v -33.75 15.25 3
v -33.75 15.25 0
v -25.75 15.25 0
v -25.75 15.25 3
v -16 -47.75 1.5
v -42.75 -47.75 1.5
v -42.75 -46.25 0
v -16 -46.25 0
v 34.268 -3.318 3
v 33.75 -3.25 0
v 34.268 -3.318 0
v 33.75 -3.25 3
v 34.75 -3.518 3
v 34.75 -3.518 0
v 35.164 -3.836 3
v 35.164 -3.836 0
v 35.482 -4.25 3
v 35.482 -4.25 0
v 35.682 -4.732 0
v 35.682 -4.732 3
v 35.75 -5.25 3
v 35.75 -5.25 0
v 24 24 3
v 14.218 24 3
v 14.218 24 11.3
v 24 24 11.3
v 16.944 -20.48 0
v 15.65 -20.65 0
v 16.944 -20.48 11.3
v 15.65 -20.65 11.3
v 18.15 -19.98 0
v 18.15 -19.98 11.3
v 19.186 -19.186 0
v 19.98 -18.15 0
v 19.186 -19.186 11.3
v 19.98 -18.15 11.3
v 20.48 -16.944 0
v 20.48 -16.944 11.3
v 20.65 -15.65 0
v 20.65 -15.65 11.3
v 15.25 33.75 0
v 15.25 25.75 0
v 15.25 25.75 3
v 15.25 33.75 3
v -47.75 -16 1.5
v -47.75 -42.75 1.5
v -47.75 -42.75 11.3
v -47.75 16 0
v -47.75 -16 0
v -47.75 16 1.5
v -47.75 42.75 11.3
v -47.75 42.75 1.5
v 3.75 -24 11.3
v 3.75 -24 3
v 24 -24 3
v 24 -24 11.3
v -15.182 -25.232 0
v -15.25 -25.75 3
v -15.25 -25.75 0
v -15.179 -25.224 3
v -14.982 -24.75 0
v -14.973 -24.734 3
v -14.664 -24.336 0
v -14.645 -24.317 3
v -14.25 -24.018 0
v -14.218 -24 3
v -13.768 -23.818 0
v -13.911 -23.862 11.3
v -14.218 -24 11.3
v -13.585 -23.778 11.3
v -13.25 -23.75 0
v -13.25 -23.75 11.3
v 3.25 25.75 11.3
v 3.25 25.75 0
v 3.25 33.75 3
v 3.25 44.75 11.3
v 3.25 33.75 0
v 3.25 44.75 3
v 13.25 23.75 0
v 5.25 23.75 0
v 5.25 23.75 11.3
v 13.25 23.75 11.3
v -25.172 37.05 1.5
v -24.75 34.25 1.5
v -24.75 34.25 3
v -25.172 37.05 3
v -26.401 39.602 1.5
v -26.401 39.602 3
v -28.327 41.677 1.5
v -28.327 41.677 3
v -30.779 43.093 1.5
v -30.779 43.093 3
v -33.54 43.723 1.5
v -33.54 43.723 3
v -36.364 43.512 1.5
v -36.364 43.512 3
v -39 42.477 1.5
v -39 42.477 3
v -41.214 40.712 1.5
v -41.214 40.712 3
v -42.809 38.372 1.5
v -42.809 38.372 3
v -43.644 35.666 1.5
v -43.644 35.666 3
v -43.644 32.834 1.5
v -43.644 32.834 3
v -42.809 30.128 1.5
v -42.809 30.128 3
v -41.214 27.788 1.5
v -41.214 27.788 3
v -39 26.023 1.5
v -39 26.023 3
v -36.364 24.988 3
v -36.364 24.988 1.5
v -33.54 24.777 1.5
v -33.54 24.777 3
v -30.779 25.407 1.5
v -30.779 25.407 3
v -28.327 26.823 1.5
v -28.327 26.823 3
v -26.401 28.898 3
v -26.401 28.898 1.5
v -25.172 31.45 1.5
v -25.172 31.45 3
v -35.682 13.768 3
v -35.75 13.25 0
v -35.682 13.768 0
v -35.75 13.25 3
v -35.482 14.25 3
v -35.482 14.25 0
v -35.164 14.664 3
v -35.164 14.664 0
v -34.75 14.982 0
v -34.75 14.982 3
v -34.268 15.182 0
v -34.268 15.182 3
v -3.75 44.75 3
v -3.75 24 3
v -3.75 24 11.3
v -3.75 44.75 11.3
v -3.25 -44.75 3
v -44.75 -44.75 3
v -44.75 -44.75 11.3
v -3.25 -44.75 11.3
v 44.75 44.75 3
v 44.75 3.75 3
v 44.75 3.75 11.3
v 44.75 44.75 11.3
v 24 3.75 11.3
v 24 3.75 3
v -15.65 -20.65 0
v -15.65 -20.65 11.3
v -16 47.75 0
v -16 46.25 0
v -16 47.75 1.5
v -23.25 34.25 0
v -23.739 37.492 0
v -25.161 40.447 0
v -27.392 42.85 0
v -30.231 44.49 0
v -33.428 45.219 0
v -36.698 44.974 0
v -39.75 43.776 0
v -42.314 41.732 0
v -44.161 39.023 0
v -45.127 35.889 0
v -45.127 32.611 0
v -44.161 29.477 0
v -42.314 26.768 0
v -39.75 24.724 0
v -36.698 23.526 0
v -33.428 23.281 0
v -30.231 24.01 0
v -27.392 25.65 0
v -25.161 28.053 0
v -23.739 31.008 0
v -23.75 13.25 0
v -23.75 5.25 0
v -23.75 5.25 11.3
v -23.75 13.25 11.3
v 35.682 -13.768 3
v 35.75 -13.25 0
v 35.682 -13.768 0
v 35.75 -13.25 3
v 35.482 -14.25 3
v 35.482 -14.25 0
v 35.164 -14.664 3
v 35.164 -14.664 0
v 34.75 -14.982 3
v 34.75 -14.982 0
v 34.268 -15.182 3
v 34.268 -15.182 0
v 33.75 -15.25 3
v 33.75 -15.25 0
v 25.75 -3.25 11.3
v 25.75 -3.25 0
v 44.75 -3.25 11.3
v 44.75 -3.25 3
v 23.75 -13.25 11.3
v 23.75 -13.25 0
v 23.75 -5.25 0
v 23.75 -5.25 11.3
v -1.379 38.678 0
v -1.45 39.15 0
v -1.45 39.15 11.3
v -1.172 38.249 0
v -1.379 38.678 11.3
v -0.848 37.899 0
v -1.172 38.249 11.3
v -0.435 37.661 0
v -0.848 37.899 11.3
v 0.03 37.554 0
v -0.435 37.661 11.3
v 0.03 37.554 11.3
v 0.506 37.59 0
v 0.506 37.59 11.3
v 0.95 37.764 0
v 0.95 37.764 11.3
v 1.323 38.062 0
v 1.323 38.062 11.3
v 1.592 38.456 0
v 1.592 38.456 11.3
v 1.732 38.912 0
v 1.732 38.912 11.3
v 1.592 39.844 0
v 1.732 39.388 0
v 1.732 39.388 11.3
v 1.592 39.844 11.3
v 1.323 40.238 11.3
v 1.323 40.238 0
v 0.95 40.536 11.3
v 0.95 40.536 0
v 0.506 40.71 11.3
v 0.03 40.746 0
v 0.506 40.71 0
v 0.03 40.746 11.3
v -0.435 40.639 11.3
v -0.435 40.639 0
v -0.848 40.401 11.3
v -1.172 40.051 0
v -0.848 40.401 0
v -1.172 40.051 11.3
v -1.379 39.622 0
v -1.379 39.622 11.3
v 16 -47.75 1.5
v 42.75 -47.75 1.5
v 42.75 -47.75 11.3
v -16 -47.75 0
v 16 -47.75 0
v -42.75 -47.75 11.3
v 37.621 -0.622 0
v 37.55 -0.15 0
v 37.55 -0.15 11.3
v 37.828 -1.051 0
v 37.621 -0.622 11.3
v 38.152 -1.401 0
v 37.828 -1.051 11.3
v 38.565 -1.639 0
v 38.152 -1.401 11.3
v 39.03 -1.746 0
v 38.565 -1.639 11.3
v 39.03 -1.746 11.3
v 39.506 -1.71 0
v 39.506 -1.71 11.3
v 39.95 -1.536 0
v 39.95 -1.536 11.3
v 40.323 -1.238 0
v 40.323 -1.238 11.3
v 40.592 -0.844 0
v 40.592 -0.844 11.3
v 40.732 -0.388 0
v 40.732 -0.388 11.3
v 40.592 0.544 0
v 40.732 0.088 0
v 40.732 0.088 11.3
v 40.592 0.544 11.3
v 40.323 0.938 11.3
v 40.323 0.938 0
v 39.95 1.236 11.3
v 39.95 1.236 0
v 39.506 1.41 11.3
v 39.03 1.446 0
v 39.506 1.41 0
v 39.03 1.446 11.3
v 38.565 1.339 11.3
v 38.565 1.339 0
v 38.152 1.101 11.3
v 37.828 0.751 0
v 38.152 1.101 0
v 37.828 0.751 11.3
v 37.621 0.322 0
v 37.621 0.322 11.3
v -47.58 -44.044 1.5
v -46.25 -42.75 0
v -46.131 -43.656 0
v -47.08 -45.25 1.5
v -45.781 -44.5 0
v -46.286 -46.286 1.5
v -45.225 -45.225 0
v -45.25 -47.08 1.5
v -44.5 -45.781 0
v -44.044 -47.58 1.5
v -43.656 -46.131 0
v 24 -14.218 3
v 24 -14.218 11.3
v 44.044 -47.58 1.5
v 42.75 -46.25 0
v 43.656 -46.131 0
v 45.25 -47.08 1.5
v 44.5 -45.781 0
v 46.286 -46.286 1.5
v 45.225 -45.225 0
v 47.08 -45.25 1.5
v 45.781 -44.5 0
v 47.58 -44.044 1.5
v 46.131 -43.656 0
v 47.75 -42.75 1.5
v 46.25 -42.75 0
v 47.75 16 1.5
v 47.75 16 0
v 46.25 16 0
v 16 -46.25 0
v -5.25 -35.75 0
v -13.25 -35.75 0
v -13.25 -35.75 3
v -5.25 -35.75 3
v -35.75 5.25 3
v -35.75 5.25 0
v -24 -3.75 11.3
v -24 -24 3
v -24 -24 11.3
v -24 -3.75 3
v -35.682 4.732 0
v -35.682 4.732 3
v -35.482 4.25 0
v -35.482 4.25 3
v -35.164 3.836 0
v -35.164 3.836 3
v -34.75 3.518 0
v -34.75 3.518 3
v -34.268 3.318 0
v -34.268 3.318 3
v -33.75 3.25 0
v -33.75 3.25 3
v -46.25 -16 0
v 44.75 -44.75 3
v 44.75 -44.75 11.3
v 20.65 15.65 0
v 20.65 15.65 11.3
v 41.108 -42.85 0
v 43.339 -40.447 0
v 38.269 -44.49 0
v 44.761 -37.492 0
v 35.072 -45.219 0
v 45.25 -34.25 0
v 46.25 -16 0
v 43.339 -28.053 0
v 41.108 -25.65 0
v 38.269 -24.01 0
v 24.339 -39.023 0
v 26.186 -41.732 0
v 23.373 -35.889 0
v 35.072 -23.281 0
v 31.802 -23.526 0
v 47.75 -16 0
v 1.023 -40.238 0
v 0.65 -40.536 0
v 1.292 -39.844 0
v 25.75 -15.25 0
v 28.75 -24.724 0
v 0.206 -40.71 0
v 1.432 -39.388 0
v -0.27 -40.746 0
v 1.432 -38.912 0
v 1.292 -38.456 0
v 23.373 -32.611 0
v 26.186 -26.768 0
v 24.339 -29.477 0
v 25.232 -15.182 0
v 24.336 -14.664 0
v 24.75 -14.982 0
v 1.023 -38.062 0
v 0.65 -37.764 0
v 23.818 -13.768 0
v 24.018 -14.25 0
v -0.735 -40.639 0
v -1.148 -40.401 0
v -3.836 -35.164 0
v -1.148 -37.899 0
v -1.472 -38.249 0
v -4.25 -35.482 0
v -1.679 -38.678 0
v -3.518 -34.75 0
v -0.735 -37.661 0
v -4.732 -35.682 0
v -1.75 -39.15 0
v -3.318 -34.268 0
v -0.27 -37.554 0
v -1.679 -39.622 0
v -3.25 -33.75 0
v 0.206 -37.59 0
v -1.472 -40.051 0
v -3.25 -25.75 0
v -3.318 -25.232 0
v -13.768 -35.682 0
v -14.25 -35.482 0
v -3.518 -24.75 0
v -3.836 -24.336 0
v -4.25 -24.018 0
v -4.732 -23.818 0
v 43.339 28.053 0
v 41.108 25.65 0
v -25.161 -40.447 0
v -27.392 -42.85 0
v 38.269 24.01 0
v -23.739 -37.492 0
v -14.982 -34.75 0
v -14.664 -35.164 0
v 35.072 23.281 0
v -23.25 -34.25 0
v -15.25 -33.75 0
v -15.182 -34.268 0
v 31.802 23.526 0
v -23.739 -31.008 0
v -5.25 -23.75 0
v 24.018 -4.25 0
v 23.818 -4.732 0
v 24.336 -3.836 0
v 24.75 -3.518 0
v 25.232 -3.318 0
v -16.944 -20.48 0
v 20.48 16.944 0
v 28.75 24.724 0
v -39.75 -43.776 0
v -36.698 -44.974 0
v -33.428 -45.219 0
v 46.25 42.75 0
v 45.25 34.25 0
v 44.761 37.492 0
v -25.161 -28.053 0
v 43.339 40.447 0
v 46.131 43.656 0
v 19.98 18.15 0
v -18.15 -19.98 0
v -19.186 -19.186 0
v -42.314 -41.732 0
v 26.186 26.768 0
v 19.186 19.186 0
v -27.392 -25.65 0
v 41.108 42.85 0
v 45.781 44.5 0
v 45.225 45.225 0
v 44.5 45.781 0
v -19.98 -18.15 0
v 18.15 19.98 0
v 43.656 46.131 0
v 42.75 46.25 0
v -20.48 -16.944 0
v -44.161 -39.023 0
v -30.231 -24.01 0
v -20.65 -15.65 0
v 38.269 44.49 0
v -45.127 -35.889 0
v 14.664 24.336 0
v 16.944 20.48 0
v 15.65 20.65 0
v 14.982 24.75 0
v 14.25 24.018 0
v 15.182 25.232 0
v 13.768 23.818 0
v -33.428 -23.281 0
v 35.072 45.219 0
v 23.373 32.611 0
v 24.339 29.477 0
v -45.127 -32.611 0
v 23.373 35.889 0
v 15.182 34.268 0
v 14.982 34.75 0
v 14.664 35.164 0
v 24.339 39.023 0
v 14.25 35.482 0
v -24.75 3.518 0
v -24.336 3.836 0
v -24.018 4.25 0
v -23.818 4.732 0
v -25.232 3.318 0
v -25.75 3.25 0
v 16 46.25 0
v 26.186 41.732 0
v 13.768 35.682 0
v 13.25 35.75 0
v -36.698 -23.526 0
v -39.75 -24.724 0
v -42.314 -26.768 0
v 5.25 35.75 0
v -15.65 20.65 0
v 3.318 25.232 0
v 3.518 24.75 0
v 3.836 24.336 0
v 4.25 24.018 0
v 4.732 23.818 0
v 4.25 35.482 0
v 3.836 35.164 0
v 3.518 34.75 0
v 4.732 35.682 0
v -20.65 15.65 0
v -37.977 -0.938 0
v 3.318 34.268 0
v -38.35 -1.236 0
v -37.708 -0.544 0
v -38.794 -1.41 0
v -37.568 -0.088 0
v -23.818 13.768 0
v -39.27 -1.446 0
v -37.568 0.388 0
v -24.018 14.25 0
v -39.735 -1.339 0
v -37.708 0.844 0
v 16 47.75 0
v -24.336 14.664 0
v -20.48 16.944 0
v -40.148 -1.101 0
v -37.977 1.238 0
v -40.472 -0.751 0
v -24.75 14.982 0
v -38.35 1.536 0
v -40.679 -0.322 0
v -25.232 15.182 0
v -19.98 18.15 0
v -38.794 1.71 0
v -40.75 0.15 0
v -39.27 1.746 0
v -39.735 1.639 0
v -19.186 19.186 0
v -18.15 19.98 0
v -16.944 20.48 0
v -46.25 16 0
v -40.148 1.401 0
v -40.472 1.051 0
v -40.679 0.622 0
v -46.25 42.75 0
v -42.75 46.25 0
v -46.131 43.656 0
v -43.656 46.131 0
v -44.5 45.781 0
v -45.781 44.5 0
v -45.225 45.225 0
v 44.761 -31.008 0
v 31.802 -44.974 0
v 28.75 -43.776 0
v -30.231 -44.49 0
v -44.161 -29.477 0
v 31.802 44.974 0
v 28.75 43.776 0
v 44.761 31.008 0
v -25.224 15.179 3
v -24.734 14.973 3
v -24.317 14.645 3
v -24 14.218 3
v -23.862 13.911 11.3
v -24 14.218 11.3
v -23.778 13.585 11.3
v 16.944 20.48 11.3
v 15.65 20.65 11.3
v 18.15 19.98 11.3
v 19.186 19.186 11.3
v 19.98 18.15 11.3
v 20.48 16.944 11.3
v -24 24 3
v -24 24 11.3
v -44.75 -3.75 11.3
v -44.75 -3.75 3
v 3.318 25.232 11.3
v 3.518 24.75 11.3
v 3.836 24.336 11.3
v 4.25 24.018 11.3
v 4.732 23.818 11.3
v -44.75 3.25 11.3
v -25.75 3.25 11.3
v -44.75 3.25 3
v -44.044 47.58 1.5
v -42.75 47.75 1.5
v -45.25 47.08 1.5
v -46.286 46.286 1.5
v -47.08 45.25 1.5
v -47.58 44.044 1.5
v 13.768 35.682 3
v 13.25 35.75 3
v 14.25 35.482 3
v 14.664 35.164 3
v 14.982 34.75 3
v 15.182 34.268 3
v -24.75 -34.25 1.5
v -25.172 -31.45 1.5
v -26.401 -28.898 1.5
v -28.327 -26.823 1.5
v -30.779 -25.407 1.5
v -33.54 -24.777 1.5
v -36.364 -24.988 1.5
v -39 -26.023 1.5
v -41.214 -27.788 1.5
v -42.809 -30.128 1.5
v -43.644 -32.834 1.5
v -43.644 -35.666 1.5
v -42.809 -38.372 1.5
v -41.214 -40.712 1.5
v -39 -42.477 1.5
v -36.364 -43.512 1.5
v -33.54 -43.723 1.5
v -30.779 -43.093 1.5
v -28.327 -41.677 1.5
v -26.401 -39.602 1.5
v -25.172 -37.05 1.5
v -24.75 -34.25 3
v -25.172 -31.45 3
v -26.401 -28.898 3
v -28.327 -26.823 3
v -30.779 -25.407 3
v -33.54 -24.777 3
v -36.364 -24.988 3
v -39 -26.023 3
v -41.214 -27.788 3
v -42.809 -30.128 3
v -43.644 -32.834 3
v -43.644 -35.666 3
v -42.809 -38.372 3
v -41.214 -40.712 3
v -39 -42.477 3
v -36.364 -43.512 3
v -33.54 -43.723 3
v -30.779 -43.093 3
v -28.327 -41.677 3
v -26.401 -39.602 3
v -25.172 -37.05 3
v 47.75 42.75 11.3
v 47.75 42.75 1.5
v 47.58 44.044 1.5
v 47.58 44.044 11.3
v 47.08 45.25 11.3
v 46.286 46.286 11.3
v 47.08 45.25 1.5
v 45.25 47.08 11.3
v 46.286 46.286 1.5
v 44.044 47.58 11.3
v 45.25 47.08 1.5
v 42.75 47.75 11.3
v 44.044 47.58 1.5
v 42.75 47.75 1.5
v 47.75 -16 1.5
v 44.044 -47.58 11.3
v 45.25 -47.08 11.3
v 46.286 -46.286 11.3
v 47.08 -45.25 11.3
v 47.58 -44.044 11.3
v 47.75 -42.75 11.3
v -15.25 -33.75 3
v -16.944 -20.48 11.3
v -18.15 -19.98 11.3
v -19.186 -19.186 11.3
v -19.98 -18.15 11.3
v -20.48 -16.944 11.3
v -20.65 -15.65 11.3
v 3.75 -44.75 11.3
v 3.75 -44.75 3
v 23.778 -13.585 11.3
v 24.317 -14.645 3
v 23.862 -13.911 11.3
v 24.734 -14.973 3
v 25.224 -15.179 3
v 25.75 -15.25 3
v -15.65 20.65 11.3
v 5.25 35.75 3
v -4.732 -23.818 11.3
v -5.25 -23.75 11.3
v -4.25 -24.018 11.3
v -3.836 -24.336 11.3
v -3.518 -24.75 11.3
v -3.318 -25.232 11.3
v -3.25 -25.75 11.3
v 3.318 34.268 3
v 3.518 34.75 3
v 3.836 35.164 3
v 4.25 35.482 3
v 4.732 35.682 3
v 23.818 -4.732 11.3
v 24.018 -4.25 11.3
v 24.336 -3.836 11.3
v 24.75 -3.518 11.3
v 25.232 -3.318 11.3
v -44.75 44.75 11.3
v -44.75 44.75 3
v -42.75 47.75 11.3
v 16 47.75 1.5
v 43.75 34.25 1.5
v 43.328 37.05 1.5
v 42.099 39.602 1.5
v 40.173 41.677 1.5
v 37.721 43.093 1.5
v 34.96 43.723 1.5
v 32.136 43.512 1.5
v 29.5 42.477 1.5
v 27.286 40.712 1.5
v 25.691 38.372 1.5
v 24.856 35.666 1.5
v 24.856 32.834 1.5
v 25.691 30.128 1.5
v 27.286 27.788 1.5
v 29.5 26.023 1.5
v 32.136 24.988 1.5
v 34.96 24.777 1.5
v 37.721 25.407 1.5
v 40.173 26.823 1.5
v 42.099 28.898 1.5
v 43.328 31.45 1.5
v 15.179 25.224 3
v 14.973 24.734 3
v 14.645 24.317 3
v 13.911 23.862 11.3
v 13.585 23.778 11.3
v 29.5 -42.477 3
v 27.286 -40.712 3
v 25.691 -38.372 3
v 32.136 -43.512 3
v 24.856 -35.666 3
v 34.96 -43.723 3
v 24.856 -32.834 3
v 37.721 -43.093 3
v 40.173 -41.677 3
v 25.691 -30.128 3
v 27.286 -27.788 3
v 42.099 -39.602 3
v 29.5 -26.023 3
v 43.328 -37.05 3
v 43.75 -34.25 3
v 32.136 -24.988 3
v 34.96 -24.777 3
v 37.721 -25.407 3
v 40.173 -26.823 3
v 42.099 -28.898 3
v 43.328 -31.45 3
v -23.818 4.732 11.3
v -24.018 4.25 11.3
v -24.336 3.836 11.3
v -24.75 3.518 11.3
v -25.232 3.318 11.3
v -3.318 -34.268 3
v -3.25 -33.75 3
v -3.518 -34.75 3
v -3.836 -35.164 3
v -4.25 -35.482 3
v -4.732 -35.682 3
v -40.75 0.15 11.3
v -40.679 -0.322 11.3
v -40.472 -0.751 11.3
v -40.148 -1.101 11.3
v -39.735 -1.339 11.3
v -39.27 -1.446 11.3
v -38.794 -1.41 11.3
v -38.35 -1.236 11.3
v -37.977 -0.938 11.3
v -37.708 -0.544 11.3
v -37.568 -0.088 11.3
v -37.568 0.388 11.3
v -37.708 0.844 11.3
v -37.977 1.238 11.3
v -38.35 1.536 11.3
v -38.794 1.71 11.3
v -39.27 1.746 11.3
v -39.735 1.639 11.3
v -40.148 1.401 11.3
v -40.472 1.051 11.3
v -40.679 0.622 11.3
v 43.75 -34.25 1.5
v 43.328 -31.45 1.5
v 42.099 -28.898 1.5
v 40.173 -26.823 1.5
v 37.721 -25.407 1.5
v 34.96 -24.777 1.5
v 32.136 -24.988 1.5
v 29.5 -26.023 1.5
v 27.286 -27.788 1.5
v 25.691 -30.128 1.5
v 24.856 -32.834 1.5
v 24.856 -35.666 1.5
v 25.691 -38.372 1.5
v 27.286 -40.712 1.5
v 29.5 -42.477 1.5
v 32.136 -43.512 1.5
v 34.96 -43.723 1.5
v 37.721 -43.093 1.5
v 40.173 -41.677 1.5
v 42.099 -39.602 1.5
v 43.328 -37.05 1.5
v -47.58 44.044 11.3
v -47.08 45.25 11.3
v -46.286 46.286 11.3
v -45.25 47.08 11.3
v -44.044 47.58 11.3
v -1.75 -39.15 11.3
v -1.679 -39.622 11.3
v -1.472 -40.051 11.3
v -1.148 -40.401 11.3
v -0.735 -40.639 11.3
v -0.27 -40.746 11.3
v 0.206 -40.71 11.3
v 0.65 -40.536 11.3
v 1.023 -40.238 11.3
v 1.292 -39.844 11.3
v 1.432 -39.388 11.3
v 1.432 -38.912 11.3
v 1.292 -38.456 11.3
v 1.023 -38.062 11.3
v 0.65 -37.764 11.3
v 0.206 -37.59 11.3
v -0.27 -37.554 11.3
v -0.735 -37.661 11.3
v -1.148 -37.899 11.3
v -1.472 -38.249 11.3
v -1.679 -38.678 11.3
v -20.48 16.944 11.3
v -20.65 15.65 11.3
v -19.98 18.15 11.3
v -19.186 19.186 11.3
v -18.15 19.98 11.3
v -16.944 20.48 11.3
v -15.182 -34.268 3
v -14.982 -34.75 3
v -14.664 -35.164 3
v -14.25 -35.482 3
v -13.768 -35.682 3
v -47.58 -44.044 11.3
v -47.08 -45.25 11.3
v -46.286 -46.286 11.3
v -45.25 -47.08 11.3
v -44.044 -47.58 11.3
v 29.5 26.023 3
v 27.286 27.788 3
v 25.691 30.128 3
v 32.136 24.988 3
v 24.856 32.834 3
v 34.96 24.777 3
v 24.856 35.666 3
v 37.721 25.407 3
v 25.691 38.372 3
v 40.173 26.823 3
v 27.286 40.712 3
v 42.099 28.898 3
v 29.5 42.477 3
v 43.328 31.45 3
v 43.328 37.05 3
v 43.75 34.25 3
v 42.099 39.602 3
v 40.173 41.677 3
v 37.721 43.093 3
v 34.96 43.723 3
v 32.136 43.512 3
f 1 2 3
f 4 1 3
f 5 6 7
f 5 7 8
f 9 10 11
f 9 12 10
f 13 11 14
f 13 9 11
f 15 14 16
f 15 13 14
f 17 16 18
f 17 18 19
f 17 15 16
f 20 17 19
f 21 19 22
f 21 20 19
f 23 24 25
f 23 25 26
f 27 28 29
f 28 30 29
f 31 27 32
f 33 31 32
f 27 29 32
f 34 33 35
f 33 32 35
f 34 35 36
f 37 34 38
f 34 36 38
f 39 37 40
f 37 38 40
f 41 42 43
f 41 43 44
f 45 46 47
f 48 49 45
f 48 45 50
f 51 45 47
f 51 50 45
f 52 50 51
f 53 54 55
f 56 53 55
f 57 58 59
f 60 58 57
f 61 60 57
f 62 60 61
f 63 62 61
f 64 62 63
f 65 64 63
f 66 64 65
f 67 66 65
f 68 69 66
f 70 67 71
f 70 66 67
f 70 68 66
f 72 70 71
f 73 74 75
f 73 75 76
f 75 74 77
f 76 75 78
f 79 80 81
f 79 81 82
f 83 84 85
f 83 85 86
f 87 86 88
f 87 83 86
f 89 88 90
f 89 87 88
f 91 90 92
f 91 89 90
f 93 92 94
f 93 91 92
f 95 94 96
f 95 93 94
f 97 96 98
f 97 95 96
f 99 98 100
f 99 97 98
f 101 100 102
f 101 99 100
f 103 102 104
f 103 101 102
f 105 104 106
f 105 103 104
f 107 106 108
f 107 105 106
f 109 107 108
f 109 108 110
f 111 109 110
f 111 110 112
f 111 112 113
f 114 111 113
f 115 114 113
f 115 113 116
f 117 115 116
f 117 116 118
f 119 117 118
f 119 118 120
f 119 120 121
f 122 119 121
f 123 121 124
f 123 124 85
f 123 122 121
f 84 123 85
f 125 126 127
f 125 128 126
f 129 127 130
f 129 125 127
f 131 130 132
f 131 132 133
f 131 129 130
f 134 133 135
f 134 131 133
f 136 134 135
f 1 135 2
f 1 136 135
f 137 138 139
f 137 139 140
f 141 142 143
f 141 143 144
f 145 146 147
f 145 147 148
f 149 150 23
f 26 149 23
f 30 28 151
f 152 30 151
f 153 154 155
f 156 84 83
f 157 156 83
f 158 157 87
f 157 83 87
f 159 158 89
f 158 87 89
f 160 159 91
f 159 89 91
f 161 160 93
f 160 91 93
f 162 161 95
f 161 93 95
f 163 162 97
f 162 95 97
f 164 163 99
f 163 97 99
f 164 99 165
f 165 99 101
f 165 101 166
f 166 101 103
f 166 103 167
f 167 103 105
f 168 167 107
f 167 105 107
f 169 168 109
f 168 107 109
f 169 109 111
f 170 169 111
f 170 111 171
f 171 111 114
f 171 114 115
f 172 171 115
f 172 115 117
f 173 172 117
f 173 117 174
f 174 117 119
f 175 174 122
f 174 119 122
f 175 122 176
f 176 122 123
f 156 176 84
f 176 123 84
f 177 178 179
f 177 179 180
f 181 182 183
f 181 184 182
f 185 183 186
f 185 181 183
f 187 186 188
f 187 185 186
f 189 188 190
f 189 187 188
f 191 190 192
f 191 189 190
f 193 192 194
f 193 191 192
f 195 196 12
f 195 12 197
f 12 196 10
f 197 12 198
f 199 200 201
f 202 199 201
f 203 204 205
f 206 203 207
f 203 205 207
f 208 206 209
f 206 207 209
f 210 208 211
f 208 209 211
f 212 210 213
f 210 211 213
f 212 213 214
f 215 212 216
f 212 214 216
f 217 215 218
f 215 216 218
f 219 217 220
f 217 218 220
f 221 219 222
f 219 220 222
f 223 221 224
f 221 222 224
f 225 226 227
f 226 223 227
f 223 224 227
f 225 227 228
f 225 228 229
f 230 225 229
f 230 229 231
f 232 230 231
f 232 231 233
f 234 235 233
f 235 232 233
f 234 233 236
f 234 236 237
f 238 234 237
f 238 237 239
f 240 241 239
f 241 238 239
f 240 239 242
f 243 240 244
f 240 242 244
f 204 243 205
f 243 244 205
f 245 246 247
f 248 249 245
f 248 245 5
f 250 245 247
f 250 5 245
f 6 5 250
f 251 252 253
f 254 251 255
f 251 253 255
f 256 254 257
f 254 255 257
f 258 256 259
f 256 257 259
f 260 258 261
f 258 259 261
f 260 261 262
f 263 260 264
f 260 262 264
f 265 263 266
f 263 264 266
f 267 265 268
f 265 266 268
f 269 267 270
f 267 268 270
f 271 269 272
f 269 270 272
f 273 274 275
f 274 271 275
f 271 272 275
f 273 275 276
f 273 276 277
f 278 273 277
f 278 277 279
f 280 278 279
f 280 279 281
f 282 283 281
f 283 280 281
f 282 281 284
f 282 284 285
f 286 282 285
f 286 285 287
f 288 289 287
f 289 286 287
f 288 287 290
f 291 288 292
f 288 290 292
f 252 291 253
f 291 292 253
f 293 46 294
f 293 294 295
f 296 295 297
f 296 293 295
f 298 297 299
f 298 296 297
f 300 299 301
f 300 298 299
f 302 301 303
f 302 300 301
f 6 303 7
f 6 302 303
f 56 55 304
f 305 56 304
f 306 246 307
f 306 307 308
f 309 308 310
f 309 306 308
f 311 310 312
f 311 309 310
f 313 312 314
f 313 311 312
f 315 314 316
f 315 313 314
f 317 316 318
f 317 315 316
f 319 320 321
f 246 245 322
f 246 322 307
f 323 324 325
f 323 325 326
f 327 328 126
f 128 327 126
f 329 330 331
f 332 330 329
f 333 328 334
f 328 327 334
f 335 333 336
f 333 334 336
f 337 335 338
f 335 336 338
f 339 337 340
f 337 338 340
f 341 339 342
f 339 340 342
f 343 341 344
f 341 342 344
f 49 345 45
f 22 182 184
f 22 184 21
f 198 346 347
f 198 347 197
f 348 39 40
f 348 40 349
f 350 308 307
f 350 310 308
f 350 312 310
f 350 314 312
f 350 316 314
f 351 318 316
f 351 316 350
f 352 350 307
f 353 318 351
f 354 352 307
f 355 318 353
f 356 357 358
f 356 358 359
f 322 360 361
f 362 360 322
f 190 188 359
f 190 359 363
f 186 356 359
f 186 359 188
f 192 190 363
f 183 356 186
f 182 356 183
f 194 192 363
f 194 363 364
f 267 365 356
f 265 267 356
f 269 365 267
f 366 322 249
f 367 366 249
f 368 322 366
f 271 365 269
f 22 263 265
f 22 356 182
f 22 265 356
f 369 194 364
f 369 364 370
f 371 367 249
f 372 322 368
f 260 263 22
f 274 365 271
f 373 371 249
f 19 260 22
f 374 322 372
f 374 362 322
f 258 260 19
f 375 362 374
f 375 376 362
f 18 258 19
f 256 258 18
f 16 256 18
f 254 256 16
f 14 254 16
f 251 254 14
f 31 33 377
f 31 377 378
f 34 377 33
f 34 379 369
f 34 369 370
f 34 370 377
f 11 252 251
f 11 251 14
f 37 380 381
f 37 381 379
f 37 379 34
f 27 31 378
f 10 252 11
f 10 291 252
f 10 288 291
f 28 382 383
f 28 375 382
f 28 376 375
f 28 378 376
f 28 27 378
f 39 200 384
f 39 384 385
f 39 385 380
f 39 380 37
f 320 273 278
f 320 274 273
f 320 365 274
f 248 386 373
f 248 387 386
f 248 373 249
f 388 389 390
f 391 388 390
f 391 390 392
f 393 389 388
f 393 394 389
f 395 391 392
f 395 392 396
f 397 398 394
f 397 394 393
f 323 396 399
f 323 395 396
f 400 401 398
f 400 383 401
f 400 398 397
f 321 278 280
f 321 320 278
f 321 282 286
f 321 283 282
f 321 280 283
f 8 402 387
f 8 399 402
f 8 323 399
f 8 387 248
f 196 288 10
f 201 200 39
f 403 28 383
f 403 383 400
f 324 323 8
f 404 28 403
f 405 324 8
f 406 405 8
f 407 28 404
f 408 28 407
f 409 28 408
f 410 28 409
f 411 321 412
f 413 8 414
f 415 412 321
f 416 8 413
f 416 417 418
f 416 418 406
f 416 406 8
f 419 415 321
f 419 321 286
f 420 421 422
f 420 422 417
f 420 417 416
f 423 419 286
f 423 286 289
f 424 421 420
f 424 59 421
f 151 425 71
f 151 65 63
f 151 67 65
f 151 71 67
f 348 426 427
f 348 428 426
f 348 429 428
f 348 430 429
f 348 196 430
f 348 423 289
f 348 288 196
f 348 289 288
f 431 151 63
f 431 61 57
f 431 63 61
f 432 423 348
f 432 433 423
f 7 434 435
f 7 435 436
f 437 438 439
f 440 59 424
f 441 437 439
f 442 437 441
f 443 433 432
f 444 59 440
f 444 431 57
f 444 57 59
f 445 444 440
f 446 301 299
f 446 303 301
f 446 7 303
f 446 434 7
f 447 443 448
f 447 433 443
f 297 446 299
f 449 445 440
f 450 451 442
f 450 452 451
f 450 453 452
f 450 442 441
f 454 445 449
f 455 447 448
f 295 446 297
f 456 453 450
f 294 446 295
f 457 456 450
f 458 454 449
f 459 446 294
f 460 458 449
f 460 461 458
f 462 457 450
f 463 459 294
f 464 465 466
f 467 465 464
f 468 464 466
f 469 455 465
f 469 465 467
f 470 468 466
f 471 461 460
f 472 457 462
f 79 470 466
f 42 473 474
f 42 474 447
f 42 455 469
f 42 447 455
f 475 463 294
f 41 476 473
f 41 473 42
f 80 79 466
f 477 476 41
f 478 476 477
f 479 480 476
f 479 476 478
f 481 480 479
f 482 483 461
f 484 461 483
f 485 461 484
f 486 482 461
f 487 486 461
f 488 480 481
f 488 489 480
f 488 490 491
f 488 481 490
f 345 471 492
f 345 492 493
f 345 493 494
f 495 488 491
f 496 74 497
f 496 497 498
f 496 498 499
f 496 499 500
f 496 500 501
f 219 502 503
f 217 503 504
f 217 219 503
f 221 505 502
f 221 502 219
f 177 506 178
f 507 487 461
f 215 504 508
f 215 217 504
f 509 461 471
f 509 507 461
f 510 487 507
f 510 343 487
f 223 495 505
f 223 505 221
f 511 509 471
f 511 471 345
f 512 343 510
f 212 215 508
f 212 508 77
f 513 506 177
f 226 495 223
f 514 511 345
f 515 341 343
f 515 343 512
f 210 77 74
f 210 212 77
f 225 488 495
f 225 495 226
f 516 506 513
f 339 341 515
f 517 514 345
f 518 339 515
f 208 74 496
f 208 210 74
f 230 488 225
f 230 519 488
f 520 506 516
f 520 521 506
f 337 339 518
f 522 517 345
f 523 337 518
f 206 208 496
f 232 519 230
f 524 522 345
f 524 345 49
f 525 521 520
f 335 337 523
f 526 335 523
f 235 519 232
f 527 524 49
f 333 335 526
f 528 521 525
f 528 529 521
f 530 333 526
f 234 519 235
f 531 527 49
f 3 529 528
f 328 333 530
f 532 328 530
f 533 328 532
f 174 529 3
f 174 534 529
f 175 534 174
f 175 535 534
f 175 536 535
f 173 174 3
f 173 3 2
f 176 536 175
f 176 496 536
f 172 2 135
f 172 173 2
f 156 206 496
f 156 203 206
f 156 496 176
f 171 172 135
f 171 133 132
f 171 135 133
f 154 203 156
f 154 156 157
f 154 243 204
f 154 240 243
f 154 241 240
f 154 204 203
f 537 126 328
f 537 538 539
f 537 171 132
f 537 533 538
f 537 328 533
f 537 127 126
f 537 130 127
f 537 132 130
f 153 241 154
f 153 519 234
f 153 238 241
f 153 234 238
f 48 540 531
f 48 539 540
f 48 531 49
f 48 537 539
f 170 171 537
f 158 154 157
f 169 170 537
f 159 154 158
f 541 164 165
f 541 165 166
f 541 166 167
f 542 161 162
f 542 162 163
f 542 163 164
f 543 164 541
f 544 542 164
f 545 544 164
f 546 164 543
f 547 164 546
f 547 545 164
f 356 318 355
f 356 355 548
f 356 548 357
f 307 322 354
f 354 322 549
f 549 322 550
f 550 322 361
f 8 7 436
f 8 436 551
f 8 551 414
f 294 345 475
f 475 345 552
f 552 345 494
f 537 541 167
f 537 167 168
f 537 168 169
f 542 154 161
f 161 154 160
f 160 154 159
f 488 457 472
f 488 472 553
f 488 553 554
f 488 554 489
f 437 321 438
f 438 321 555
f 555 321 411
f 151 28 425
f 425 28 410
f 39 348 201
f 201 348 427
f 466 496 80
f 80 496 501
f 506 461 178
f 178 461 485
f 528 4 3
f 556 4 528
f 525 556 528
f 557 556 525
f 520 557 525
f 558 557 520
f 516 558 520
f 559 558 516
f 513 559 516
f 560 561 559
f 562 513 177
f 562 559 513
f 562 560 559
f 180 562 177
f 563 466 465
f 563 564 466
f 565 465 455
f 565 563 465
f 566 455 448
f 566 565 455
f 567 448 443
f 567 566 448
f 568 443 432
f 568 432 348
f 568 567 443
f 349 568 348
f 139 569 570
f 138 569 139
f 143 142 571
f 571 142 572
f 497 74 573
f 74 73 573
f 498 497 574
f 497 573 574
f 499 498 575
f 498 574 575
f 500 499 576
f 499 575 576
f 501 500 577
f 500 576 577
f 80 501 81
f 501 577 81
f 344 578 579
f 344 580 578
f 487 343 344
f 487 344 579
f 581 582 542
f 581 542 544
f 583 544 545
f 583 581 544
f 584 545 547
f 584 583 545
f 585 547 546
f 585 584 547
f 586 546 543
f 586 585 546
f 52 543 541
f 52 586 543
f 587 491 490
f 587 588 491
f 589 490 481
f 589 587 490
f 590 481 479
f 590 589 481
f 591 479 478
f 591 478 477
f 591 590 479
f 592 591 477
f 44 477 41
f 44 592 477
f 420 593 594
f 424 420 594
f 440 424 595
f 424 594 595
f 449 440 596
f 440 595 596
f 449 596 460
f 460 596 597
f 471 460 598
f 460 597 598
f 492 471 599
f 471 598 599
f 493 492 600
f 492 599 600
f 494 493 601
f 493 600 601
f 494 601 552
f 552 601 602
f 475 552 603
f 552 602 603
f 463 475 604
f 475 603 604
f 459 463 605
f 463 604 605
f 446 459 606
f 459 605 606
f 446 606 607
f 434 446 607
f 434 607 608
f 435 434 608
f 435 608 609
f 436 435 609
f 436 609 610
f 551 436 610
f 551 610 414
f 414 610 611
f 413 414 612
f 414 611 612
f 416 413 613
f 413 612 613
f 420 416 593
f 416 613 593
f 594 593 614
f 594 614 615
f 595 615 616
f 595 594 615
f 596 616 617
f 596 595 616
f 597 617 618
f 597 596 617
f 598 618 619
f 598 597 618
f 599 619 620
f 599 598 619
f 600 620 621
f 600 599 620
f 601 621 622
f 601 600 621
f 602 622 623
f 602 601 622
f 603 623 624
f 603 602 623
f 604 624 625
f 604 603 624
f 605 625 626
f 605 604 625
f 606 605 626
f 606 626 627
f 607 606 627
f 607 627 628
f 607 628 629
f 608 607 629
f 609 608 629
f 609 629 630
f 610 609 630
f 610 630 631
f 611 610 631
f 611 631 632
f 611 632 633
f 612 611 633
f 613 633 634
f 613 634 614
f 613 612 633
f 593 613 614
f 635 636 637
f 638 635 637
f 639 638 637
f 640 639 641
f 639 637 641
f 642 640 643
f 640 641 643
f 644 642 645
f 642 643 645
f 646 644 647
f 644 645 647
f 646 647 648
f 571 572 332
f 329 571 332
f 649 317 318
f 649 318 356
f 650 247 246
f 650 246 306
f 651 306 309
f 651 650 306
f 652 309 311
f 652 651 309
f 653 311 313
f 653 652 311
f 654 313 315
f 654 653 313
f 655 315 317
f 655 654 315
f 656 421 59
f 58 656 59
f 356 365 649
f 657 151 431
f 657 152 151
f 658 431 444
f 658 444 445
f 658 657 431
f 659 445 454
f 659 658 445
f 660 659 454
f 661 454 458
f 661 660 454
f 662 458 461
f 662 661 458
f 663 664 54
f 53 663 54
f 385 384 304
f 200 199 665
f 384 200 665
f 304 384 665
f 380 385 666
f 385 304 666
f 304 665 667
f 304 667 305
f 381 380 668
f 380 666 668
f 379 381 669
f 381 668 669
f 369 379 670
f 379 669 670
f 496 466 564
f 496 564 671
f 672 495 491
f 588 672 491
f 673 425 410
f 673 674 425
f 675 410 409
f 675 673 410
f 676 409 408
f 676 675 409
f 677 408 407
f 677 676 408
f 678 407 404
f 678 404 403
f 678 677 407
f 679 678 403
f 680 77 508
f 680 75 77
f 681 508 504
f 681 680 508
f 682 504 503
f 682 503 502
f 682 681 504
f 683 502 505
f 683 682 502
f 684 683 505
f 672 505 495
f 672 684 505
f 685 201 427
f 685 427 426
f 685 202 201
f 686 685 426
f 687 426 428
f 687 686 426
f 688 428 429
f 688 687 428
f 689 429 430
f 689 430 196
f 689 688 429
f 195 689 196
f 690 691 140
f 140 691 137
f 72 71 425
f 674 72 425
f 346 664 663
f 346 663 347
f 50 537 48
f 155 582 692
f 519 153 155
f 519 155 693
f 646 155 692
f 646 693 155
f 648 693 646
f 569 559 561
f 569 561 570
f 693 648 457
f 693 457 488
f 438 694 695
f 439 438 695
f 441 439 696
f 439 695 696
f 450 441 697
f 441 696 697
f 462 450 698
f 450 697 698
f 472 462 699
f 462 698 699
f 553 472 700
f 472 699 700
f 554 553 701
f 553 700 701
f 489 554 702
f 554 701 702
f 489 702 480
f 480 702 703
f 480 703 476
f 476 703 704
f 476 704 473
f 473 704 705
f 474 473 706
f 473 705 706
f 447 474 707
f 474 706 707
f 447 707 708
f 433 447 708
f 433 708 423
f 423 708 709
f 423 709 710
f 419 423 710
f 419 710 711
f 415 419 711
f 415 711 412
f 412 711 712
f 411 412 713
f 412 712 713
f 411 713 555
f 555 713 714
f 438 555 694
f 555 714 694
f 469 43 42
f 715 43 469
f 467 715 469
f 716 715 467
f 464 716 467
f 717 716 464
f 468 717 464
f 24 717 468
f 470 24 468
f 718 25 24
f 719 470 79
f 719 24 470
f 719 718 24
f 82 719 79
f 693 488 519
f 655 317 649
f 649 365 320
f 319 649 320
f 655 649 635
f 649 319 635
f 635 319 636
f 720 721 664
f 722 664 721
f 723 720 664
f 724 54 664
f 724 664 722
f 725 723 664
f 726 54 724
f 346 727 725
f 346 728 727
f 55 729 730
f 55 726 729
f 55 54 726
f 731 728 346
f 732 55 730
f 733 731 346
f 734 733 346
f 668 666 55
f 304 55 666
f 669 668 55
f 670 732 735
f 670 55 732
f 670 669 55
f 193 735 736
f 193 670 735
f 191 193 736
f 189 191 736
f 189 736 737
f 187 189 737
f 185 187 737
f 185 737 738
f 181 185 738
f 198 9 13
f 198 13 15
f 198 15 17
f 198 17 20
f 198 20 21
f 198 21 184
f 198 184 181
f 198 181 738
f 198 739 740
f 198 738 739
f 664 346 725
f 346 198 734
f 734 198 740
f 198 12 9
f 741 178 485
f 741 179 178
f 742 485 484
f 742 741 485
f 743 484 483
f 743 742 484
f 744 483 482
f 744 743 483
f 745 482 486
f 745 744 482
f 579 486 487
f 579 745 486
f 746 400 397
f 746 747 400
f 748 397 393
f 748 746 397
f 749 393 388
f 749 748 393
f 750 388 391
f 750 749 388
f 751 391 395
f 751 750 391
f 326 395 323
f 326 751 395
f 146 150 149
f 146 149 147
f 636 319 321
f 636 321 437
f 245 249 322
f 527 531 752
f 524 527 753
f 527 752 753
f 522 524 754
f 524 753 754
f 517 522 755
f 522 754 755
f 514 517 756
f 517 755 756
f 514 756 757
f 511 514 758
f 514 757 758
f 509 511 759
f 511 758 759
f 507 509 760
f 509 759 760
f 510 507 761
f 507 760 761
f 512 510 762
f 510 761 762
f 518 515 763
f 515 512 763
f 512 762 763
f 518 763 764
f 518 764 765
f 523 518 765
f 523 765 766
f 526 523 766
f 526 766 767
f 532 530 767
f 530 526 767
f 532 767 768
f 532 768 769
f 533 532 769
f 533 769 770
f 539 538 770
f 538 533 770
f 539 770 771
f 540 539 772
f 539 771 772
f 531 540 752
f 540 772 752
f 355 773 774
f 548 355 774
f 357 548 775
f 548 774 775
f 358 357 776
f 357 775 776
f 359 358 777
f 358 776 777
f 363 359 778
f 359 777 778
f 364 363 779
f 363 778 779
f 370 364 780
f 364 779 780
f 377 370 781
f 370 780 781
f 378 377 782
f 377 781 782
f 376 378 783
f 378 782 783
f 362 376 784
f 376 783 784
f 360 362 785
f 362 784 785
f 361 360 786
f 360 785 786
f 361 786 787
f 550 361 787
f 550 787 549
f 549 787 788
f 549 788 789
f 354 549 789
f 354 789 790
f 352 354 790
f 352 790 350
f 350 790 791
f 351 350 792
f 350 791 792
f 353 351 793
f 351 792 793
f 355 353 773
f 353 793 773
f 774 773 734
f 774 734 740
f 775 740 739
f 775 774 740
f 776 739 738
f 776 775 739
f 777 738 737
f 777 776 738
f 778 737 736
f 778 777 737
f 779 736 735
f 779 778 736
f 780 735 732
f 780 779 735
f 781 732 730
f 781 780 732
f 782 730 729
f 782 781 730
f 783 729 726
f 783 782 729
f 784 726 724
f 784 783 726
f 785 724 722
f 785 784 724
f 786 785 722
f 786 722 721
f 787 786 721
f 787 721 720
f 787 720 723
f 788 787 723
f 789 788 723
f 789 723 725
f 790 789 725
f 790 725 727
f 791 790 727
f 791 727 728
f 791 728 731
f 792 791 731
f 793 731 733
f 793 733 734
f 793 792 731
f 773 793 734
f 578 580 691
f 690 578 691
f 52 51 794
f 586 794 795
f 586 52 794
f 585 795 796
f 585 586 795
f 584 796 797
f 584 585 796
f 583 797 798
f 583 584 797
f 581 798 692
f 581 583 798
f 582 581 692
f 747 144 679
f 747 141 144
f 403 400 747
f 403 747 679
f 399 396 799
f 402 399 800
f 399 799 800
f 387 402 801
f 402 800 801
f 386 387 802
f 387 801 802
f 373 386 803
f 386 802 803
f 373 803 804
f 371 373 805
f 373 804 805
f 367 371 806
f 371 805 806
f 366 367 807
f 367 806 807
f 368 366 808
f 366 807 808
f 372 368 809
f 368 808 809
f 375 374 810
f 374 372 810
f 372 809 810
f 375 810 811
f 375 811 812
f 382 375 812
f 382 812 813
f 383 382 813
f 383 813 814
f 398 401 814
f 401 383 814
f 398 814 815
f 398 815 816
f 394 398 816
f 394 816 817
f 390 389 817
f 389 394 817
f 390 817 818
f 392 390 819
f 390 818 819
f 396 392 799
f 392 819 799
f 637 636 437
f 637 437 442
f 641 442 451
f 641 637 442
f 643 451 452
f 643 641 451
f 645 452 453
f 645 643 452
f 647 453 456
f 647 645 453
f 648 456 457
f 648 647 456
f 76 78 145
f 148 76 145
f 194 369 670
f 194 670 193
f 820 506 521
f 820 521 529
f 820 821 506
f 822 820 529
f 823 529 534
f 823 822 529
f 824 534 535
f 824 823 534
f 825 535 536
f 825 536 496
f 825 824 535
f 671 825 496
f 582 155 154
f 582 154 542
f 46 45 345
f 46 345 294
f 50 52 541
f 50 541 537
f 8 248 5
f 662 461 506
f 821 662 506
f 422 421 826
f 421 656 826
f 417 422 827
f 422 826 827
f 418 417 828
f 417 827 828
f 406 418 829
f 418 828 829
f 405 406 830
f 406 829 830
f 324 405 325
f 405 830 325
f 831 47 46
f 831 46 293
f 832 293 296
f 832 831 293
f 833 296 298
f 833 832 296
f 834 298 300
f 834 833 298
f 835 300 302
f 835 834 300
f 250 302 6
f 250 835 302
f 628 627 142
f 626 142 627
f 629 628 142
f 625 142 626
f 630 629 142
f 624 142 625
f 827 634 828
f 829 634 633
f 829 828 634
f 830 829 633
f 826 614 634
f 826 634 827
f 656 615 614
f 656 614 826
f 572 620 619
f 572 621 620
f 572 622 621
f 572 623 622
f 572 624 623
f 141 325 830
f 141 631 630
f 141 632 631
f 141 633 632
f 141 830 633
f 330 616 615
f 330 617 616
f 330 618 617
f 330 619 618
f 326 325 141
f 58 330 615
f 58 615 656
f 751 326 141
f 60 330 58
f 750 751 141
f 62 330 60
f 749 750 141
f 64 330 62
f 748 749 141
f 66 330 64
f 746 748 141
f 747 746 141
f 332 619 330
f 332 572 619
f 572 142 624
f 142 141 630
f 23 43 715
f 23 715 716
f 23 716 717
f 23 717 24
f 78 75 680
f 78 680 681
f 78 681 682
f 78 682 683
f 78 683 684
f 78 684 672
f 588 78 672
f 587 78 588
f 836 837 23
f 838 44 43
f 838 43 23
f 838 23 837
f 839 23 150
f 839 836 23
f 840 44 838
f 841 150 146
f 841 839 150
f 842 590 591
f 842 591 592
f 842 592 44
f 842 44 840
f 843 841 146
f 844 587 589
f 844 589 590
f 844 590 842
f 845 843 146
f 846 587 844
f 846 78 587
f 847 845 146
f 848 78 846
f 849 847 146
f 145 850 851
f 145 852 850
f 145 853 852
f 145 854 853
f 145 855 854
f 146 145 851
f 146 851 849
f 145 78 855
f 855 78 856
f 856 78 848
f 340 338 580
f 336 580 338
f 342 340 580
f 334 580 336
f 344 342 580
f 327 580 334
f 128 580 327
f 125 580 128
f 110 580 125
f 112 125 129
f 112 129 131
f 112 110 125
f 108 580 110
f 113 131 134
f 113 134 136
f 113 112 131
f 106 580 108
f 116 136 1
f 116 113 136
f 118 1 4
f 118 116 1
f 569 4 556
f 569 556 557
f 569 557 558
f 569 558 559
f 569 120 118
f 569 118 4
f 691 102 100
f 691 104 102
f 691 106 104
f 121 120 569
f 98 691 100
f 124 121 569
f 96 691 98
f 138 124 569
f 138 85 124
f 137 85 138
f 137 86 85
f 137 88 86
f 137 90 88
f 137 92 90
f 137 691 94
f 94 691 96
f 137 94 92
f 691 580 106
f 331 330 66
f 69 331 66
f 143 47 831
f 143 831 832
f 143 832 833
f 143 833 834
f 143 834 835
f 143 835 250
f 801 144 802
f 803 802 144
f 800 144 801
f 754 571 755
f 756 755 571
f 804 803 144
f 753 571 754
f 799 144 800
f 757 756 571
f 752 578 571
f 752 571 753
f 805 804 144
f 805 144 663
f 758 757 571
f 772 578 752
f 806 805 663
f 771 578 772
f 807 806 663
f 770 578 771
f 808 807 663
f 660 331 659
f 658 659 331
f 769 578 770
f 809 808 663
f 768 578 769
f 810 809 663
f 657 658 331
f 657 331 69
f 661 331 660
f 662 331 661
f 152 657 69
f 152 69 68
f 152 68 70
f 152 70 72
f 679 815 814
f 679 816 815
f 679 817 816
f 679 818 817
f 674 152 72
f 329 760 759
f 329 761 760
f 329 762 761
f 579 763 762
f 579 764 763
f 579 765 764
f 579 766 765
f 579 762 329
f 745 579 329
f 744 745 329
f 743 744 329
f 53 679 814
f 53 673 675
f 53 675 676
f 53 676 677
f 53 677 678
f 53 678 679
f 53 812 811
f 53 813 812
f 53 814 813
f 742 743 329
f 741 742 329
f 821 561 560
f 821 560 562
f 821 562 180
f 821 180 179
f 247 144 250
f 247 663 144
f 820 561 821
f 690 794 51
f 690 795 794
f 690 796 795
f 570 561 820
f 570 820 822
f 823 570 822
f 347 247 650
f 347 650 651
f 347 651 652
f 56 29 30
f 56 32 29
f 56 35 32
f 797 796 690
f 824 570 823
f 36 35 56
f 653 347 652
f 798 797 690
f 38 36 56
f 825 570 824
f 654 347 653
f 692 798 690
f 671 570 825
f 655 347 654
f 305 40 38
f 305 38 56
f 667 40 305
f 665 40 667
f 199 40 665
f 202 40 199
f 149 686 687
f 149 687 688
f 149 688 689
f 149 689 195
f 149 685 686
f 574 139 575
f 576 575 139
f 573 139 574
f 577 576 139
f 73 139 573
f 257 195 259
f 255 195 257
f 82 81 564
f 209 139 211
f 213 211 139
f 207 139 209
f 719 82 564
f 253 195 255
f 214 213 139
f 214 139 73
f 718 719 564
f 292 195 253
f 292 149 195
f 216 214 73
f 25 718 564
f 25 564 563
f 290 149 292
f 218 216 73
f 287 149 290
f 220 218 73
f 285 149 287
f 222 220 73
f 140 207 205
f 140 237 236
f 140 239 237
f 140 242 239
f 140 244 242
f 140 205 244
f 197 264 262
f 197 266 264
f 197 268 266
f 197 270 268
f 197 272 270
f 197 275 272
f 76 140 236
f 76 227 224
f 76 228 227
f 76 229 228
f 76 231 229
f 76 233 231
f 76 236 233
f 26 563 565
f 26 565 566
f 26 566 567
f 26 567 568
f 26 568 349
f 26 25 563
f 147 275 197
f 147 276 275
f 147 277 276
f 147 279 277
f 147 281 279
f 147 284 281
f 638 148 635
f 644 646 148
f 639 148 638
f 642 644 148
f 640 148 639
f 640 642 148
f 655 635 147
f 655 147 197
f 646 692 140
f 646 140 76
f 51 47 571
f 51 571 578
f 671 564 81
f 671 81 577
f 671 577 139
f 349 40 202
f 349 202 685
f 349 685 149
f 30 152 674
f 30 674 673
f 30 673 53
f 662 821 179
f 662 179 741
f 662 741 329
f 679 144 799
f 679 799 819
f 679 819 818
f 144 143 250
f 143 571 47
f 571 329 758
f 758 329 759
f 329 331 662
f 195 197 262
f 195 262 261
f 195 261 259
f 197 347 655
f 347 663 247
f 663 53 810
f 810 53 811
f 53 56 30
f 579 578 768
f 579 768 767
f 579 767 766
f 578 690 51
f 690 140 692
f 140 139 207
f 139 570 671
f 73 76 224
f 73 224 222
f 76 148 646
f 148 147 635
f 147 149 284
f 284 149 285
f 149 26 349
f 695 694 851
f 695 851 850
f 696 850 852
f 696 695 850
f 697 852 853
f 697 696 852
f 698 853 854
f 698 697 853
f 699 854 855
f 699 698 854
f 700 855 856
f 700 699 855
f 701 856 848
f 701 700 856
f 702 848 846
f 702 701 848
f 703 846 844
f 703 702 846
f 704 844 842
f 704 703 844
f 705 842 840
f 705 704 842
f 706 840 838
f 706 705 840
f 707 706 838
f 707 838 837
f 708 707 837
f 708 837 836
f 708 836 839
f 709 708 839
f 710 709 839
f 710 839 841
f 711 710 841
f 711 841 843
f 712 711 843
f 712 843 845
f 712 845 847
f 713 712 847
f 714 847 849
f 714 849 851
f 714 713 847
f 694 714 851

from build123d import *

# Parameters (mm, degrees)
SKETCH_1_W                = 95.5
SKETCH_1_H                = 95.5
SKETCH_1_R                = 9.5
EXTRUDE_1_DEPTH           = 3
SKETCH_3_W                = 42
SKETCH_3_H                = 42
CUT_EXTRUDE_2_DEPTH       = 68.595303091
SKETCH_5_W                = 95.5
SKETCH_5_H                = 95.5
SKETCH_5_W_2              = 89.5
SKETCH_5_H_2              = 89.5
EXTRUDE_2_DEPTH           = 8.3
FILLET_1_R                = 5
SKETCH_7_W                = 48
SKETCH_7_H                = 48
SKETCH_7_W_2              = 42
SKETCH_7_H_2              = 42
EXTRUDE_4_DEPTH           = 8.3
CHAMFER_3_SIZE            = 1.5
CHAMFER_5_SIZE            = 1.5
SKETCH_12_R               = 1.6
CUT_EXTRUDE_8_DEPTH       = 69.467620084
SKETCH_13_W               = 20.75
SKETCH_13_H               = 7
SKETCH_13_W_2             = 7
SKETCH_13_H_2             = 20.75
EXTRUDE_5_DEPTH           = 8.3
SKETCH_14_R               = 1.6
CUT_EXTRUDE_9_DEPTH       = 69.467620084
EXTRUDE_6_REACH           = 70.468
SKETCH_15_W               = 32
SKETCH_15_H               = 1.5
SKETCH_15_W_2             = 1.5
SKETCH_15_H_2             = 32
CUT_EXTRUDE_10_DEPTH      = 69.036865007
CUT_EXTRUDE_10_DEPTH_BACK = 69.036865007
SKETCH_16_W               = 12
SKETCH_16_H               = 12
SKETCH_17_W               = 42
SKETCH_17_H               = 42
EXTRUDE_7_DEPTH           = 11.3
FILLET_2_R                = 2
SKETCH_18_W               = 41.3
SKETCH_18_H               = 41.3
CUT_EXTRUDE_11_DEPTH      = 69.467620084
FILLET_3_R                = 5


with BuildPart() as part:
    # ｽｹｯﾁ1 → ﾎﾞｽ - 押し出し1 (new body)
    with BuildSketch(Plane.XY):
        Rectangle(SKETCH_1_W, SKETCH_1_H)
        with Locations((-34.25, 34.25)):
            Circle(SKETCH_1_R, mode=Mode.SUBTRACT)
        with Locations((34.25, 34.25)):
            Circle(SKETCH_1_R, mode=Mode.SUBTRACT)
        with Locations((34.25, -34.25)):
            Circle(SKETCH_1_R, mode=Mode.SUBTRACT)
        with Locations((-34.25, -34.25)):
            Circle(SKETCH_1_R, mode=Mode.SUBTRACT)
    extrude(amount=EXTRUDE_1_DEPTH)

    # ｽｹｯﾁ3 → ｶｯﾄ - 押し出し2 (cut, through all)
    with BuildSketch(Plane.XY.offset(3)):
        Rectangle(SKETCH_3_W, SKETCH_3_H)
    extrude(amount=-CUT_EXTRUDE_2_DEPTH, mode=Mode.SUBTRACT)

    # ｽｹｯﾁ5 → ﾎﾞｽ - 押し出し2 (add)
    with BuildSketch(Plane.XY.offset(3)):
        Rectangle(SKETCH_5_W, SKETCH_5_H)
        Rectangle(SKETCH_5_W_2, SKETCH_5_H_2, mode=Mode.SUBTRACT)
    extrude(amount=EXTRUDE_2_DEPTH)

    # ﾌｨﾚｯﾄ1
    fillet_1_edges = [part.edges().sort_by_distance(p)[0] for p in [
        (-47.75, 47.75, 5.65),
        (47.75, 47.75, 5.65),
        (47.75, -47.75, 5.65),
        (-47.75, -47.75, 5.65),
    ]]
    fillet(fillet_1_edges, radius=FILLET_1_R)

    # ｽｹｯﾁ7 → ﾎﾞｽ - 押し出し4 (add)
    with BuildSketch(Plane.XY.offset(3)):
        Rectangle(SKETCH_7_W, SKETCH_7_H)
        Rectangle(SKETCH_7_W_2, SKETCH_7_H_2, mode=Mode.SUBTRACT)
    extrude(amount=EXTRUDE_4_DEPTH)

    # 面取り3
    chamfer_3_edges = [part.edges().sort_by_distance(p)[0] for p in [
        (47.75, 0, 0),
        (-47.75, 0, 0),
        (0, 47.75, 0),
        (0, -47.75, 0),
        (-46.285533906, 46.285533906, 0),
        (46.285533906, 46.285533906, 0),
        (-46.285533906, -46.285533906, 0),
        (46.285533906, -46.285533906, 0),
    ]]
    chamfer(chamfer_3_edges, length=CHAMFER_3_SIZE)

    # 面取り5
    chamfer_5_edges = [part.edges().sort_by_distance(p)[0] for p in [
        (-43.75, 34.25, 0),
        (24.75, 34.25, 0),
        (24.75, -34.25, 0),
        (-43.75, -34.25, 0),
    ]]
    chamfer(chamfer_5_edges, length=CHAMFER_5_SIZE)

    # ｽｹｯﾁ12 → ｶｯﾄ - 押し出し8 (cut, through all)
    with BuildSketch(Plane(origin=(0, 0, 0), x_dir=(-1, 0, 0), z_dir=(0, 0, -1))):
        with Locations((-0.15, 39.15)):
            Circle(SKETCH_12_R)
        with Locations((-39.15, -0.15)):
            Circle(SKETCH_12_R)
        with Locations((39.15, 0.15)):
            Circle(SKETCH_12_R)
        with Locations((0.15, -39.15)):
            Circle(SKETCH_12_R)
    extrude(amount=-CUT_EXTRUDE_8_DEPTH, mode=Mode.SUBTRACT)

    # ｽｹｯﾁ13 → ﾎﾞｽ - 押し出し5 (add)
    with BuildSketch(Plane.XY.offset(3)):
        with Locations((-34.375, -0.25)):
            Rectangle(SKETCH_13_W, SKETCH_13_H)
        with Locations((0.25, -34.375)):
            Rectangle(SKETCH_13_W_2, SKETCH_13_H_2)
        with Locations((34.375, 0.25)):
            Rectangle(SKETCH_13_W, SKETCH_13_H)
        with Locations((-0.25, 34.375)):
            Rectangle(SKETCH_13_W_2, SKETCH_13_H_2)
    extrude(amount=EXTRUDE_5_DEPTH)

    # ｽｹｯﾁ14 → ｶｯﾄ - 押し出し9 (cut, through all)
    with BuildSketch(Plane.XY.offset(11.3)):
        with Locations(Location((-39.15, 0.15, 0), (0, 0, 180))):
            Circle(SKETCH_14_R)
        with Locations(Location((-0.15, -39.15, 0), (0, 0, 180))):
            Circle(SKETCH_14_R)
        with Locations(Location((39.15, -0.15, 0), (0, 0, 180))):
            Circle(SKETCH_14_R)
        with Locations(Location((0.15, 39.15, 0), (0, 0, 180))):
            Circle(SKETCH_14_R)
    extrude(amount=-CUT_EXTRUDE_9_DEPTH, mode=Mode.SUBTRACT)

    # ﾎﾞｽ - 押し出し6: up to this face of the body (flat: up to its plane)
    extrude_6_end = Plane(part.part.faces().sort_by_distance((0, -46.399426048, 11.3))[0])
    # ｽｹｯﾁ15 → ﾎﾞｽ - 押し出し6 (add, up to the picked face)
    with BuildSketch(Plane(origin=(0, 0, 0), x_dir=(-1, 0, 0), z_dir=(0, 0, -1)), mode=Mode.PRIVATE) as extrude_6_sk1:
        with Locations((0, 47)):
            Rectangle(SKETCH_15_W, SKETCH_15_H)
    extrude_6_tool1 = split(extrude(extrude_6_sk1.sketch, amount=-EXTRUDE_6_REACH, mode=Mode.PRIVATE), bisect_by=extrude_6_end, keep=Keep.BOTH, mode=Mode.PRIVATE)
    # ｽｹｯﾁ15 → ﾎﾞｽ - 押し出し6 (add, up to the picked face)
    with BuildSketch(Plane(origin=(0, 0, 0), x_dir=(-1, 0, 0), z_dir=(0, 0, -1)), mode=Mode.PRIVATE) as extrude_6_sk2:
        with Locations((47, 0)):
            Rectangle(SKETCH_15_W_2, SKETCH_15_H_2)
    extrude_6_tool2 = split(extrude(extrude_6_sk2.sketch, amount=-EXTRUDE_6_REACH, mode=Mode.PRIVATE), bisect_by=extrude_6_end, keep=Keep.BOTH, mode=Mode.PRIVATE)
    # ｽｹｯﾁ15 → ﾎﾞｽ - 押し出し6 (add, up to the picked face)
    with BuildSketch(Plane(origin=(0, 0, 0), x_dir=(-1, 0, 0), z_dir=(0, 0, -1)), mode=Mode.PRIVATE) as extrude_6_sk3:
        with Locations((0, -47)):
            Rectangle(SKETCH_15_W, SKETCH_15_H)
    extrude_6_tool3 = split(extrude(extrude_6_sk3.sketch, amount=-EXTRUDE_6_REACH, mode=Mode.PRIVATE), bisect_by=extrude_6_end, keep=Keep.BOTH, mode=Mode.PRIVATE)
    # ｽｹｯﾁ15 → ﾎﾞｽ - 押し出し6 (add, up to the picked face)
    with BuildSketch(Plane(origin=(0, 0, 0), x_dir=(-1, 0, 0), z_dir=(0, 0, -1)), mode=Mode.PRIVATE) as extrude_6_sk4:
        with Locations((-47, 0)):
            Rectangle(SKETCH_15_W_2, SKETCH_15_H_2)
    extrude_6_tool4 = split(extrude(extrude_6_sk4.sketch, amount=-EXTRUDE_6_REACH, mode=Mode.PRIVATE), bisect_by=extrude_6_end, keep=Keep.BOTH, mode=Mode.PRIVATE)
    add(extrude_6_tool1.solids().sort_by(Axis((0, 47, 0), (0, 0, 1)))[0])
    add(extrude_6_tool2.solids().sort_by(Axis((-47, 0, 0), (0, 0, 1)))[0])
    add(extrude_6_tool3.solids().sort_by(Axis((0, -47, 0), (0, 0, 1)))[0])
    add(extrude_6_tool4.solids().sort_by(Axis((47, 0, 0), (0, 0, 1)))[0])

    # ｽｹｯﾁ16 → ｶｯﾄ - 押し出し10 (cut, two sides: drawn at the far end of the back side and taken through both)
    with BuildSketch(Plane.XY.offset(3).offset(-CUT_EXTRUDE_10_DEPTH_BACK)):
        with Locations((9.25, 29.75)):
            Rectangle(SKETCH_16_W, SKETCH_16_H)
        with Locations((29.75, -9.25)):
            Rectangle(SKETCH_16_W, SKETCH_16_H)
        with Locations((-9.25, -29.75)):
            Rectangle(SKETCH_16_W, SKETCH_16_H)
        with Locations((-29.75, 9.25)):
            Rectangle(SKETCH_16_W, SKETCH_16_H)
    extrude(amount=CUT_EXTRUDE_10_DEPTH + CUT_EXTRUDE_10_DEPTH_BACK, mode=Mode.SUBTRACT)

    # ｽｹｯﾁ17 → ﾎﾞｽ - 押し出し7 (add, through all)
    with BuildSketch(Plane(origin=(0, 0, 0), x_dir=(-1, 0, 0), z_dir=(0, 0, -1))):
        Rectangle(SKETCH_17_W, SKETCH_17_H)
    extrude(amount=-EXTRUDE_7_DEPTH)

    # ﾌｨﾚｯﾄ2
    fillet_2_edges = [part.edges().sort_by_distance(p)[0] for p in [
        (3.25, 35.75, 1.5),
        (15.25, 35.75, 1.5),
        (15.25, 23.75, 5.65),
        (3.25, 23.75, 5.65),
        (-35.75, 15.25, 1.5),
        (-35.75, 3.25, 1.5),
        (-23.75, 3.25, 5.65),
        (-23.75, 15.25, 5.65),
        (-15.25, -23.75, 5.65),
        (-3.25, -23.75, 5.65),
        (-3.25, -35.75, 1.5),
        (-15.25, -35.75, 1.5),
        (23.75, -15.25, 5.65),
        (35.75, -15.25, 1.5),
        (35.75, -3.25, 1.5),
        (23.75, -3.25, 5.65),
    ]]
    fillet(fillet_2_edges, radius=FILLET_2_R)

    # ｽｹｯﾁ18 → ｶｯﾄ - 押し出し11 (cut, through all)
    with BuildSketch(Plane(origin=(0, 0, 0), x_dir=(-1, 0, 0), z_dir=(0, 0, -1))):
        Rectangle(SKETCH_18_W, SKETCH_18_H)
    extrude(amount=-CUT_EXTRUDE_11_DEPTH, mode=Mode.SUBTRACT)

    # ﾌｨﾚｯﾄ3
    fillet_3_edges = [part.edges().sort_by_distance(p)[0] for p in [
        (-20.65, 20.65, 5.65),
        (-20.65, -20.65, 5.65),
        (20.65, -20.65, 5.65),
        (20.65, 20.65, 5.65),
    ]]
    fillet(fillet_3_edges, radius=FILLET_3_R)


solid = part.part
